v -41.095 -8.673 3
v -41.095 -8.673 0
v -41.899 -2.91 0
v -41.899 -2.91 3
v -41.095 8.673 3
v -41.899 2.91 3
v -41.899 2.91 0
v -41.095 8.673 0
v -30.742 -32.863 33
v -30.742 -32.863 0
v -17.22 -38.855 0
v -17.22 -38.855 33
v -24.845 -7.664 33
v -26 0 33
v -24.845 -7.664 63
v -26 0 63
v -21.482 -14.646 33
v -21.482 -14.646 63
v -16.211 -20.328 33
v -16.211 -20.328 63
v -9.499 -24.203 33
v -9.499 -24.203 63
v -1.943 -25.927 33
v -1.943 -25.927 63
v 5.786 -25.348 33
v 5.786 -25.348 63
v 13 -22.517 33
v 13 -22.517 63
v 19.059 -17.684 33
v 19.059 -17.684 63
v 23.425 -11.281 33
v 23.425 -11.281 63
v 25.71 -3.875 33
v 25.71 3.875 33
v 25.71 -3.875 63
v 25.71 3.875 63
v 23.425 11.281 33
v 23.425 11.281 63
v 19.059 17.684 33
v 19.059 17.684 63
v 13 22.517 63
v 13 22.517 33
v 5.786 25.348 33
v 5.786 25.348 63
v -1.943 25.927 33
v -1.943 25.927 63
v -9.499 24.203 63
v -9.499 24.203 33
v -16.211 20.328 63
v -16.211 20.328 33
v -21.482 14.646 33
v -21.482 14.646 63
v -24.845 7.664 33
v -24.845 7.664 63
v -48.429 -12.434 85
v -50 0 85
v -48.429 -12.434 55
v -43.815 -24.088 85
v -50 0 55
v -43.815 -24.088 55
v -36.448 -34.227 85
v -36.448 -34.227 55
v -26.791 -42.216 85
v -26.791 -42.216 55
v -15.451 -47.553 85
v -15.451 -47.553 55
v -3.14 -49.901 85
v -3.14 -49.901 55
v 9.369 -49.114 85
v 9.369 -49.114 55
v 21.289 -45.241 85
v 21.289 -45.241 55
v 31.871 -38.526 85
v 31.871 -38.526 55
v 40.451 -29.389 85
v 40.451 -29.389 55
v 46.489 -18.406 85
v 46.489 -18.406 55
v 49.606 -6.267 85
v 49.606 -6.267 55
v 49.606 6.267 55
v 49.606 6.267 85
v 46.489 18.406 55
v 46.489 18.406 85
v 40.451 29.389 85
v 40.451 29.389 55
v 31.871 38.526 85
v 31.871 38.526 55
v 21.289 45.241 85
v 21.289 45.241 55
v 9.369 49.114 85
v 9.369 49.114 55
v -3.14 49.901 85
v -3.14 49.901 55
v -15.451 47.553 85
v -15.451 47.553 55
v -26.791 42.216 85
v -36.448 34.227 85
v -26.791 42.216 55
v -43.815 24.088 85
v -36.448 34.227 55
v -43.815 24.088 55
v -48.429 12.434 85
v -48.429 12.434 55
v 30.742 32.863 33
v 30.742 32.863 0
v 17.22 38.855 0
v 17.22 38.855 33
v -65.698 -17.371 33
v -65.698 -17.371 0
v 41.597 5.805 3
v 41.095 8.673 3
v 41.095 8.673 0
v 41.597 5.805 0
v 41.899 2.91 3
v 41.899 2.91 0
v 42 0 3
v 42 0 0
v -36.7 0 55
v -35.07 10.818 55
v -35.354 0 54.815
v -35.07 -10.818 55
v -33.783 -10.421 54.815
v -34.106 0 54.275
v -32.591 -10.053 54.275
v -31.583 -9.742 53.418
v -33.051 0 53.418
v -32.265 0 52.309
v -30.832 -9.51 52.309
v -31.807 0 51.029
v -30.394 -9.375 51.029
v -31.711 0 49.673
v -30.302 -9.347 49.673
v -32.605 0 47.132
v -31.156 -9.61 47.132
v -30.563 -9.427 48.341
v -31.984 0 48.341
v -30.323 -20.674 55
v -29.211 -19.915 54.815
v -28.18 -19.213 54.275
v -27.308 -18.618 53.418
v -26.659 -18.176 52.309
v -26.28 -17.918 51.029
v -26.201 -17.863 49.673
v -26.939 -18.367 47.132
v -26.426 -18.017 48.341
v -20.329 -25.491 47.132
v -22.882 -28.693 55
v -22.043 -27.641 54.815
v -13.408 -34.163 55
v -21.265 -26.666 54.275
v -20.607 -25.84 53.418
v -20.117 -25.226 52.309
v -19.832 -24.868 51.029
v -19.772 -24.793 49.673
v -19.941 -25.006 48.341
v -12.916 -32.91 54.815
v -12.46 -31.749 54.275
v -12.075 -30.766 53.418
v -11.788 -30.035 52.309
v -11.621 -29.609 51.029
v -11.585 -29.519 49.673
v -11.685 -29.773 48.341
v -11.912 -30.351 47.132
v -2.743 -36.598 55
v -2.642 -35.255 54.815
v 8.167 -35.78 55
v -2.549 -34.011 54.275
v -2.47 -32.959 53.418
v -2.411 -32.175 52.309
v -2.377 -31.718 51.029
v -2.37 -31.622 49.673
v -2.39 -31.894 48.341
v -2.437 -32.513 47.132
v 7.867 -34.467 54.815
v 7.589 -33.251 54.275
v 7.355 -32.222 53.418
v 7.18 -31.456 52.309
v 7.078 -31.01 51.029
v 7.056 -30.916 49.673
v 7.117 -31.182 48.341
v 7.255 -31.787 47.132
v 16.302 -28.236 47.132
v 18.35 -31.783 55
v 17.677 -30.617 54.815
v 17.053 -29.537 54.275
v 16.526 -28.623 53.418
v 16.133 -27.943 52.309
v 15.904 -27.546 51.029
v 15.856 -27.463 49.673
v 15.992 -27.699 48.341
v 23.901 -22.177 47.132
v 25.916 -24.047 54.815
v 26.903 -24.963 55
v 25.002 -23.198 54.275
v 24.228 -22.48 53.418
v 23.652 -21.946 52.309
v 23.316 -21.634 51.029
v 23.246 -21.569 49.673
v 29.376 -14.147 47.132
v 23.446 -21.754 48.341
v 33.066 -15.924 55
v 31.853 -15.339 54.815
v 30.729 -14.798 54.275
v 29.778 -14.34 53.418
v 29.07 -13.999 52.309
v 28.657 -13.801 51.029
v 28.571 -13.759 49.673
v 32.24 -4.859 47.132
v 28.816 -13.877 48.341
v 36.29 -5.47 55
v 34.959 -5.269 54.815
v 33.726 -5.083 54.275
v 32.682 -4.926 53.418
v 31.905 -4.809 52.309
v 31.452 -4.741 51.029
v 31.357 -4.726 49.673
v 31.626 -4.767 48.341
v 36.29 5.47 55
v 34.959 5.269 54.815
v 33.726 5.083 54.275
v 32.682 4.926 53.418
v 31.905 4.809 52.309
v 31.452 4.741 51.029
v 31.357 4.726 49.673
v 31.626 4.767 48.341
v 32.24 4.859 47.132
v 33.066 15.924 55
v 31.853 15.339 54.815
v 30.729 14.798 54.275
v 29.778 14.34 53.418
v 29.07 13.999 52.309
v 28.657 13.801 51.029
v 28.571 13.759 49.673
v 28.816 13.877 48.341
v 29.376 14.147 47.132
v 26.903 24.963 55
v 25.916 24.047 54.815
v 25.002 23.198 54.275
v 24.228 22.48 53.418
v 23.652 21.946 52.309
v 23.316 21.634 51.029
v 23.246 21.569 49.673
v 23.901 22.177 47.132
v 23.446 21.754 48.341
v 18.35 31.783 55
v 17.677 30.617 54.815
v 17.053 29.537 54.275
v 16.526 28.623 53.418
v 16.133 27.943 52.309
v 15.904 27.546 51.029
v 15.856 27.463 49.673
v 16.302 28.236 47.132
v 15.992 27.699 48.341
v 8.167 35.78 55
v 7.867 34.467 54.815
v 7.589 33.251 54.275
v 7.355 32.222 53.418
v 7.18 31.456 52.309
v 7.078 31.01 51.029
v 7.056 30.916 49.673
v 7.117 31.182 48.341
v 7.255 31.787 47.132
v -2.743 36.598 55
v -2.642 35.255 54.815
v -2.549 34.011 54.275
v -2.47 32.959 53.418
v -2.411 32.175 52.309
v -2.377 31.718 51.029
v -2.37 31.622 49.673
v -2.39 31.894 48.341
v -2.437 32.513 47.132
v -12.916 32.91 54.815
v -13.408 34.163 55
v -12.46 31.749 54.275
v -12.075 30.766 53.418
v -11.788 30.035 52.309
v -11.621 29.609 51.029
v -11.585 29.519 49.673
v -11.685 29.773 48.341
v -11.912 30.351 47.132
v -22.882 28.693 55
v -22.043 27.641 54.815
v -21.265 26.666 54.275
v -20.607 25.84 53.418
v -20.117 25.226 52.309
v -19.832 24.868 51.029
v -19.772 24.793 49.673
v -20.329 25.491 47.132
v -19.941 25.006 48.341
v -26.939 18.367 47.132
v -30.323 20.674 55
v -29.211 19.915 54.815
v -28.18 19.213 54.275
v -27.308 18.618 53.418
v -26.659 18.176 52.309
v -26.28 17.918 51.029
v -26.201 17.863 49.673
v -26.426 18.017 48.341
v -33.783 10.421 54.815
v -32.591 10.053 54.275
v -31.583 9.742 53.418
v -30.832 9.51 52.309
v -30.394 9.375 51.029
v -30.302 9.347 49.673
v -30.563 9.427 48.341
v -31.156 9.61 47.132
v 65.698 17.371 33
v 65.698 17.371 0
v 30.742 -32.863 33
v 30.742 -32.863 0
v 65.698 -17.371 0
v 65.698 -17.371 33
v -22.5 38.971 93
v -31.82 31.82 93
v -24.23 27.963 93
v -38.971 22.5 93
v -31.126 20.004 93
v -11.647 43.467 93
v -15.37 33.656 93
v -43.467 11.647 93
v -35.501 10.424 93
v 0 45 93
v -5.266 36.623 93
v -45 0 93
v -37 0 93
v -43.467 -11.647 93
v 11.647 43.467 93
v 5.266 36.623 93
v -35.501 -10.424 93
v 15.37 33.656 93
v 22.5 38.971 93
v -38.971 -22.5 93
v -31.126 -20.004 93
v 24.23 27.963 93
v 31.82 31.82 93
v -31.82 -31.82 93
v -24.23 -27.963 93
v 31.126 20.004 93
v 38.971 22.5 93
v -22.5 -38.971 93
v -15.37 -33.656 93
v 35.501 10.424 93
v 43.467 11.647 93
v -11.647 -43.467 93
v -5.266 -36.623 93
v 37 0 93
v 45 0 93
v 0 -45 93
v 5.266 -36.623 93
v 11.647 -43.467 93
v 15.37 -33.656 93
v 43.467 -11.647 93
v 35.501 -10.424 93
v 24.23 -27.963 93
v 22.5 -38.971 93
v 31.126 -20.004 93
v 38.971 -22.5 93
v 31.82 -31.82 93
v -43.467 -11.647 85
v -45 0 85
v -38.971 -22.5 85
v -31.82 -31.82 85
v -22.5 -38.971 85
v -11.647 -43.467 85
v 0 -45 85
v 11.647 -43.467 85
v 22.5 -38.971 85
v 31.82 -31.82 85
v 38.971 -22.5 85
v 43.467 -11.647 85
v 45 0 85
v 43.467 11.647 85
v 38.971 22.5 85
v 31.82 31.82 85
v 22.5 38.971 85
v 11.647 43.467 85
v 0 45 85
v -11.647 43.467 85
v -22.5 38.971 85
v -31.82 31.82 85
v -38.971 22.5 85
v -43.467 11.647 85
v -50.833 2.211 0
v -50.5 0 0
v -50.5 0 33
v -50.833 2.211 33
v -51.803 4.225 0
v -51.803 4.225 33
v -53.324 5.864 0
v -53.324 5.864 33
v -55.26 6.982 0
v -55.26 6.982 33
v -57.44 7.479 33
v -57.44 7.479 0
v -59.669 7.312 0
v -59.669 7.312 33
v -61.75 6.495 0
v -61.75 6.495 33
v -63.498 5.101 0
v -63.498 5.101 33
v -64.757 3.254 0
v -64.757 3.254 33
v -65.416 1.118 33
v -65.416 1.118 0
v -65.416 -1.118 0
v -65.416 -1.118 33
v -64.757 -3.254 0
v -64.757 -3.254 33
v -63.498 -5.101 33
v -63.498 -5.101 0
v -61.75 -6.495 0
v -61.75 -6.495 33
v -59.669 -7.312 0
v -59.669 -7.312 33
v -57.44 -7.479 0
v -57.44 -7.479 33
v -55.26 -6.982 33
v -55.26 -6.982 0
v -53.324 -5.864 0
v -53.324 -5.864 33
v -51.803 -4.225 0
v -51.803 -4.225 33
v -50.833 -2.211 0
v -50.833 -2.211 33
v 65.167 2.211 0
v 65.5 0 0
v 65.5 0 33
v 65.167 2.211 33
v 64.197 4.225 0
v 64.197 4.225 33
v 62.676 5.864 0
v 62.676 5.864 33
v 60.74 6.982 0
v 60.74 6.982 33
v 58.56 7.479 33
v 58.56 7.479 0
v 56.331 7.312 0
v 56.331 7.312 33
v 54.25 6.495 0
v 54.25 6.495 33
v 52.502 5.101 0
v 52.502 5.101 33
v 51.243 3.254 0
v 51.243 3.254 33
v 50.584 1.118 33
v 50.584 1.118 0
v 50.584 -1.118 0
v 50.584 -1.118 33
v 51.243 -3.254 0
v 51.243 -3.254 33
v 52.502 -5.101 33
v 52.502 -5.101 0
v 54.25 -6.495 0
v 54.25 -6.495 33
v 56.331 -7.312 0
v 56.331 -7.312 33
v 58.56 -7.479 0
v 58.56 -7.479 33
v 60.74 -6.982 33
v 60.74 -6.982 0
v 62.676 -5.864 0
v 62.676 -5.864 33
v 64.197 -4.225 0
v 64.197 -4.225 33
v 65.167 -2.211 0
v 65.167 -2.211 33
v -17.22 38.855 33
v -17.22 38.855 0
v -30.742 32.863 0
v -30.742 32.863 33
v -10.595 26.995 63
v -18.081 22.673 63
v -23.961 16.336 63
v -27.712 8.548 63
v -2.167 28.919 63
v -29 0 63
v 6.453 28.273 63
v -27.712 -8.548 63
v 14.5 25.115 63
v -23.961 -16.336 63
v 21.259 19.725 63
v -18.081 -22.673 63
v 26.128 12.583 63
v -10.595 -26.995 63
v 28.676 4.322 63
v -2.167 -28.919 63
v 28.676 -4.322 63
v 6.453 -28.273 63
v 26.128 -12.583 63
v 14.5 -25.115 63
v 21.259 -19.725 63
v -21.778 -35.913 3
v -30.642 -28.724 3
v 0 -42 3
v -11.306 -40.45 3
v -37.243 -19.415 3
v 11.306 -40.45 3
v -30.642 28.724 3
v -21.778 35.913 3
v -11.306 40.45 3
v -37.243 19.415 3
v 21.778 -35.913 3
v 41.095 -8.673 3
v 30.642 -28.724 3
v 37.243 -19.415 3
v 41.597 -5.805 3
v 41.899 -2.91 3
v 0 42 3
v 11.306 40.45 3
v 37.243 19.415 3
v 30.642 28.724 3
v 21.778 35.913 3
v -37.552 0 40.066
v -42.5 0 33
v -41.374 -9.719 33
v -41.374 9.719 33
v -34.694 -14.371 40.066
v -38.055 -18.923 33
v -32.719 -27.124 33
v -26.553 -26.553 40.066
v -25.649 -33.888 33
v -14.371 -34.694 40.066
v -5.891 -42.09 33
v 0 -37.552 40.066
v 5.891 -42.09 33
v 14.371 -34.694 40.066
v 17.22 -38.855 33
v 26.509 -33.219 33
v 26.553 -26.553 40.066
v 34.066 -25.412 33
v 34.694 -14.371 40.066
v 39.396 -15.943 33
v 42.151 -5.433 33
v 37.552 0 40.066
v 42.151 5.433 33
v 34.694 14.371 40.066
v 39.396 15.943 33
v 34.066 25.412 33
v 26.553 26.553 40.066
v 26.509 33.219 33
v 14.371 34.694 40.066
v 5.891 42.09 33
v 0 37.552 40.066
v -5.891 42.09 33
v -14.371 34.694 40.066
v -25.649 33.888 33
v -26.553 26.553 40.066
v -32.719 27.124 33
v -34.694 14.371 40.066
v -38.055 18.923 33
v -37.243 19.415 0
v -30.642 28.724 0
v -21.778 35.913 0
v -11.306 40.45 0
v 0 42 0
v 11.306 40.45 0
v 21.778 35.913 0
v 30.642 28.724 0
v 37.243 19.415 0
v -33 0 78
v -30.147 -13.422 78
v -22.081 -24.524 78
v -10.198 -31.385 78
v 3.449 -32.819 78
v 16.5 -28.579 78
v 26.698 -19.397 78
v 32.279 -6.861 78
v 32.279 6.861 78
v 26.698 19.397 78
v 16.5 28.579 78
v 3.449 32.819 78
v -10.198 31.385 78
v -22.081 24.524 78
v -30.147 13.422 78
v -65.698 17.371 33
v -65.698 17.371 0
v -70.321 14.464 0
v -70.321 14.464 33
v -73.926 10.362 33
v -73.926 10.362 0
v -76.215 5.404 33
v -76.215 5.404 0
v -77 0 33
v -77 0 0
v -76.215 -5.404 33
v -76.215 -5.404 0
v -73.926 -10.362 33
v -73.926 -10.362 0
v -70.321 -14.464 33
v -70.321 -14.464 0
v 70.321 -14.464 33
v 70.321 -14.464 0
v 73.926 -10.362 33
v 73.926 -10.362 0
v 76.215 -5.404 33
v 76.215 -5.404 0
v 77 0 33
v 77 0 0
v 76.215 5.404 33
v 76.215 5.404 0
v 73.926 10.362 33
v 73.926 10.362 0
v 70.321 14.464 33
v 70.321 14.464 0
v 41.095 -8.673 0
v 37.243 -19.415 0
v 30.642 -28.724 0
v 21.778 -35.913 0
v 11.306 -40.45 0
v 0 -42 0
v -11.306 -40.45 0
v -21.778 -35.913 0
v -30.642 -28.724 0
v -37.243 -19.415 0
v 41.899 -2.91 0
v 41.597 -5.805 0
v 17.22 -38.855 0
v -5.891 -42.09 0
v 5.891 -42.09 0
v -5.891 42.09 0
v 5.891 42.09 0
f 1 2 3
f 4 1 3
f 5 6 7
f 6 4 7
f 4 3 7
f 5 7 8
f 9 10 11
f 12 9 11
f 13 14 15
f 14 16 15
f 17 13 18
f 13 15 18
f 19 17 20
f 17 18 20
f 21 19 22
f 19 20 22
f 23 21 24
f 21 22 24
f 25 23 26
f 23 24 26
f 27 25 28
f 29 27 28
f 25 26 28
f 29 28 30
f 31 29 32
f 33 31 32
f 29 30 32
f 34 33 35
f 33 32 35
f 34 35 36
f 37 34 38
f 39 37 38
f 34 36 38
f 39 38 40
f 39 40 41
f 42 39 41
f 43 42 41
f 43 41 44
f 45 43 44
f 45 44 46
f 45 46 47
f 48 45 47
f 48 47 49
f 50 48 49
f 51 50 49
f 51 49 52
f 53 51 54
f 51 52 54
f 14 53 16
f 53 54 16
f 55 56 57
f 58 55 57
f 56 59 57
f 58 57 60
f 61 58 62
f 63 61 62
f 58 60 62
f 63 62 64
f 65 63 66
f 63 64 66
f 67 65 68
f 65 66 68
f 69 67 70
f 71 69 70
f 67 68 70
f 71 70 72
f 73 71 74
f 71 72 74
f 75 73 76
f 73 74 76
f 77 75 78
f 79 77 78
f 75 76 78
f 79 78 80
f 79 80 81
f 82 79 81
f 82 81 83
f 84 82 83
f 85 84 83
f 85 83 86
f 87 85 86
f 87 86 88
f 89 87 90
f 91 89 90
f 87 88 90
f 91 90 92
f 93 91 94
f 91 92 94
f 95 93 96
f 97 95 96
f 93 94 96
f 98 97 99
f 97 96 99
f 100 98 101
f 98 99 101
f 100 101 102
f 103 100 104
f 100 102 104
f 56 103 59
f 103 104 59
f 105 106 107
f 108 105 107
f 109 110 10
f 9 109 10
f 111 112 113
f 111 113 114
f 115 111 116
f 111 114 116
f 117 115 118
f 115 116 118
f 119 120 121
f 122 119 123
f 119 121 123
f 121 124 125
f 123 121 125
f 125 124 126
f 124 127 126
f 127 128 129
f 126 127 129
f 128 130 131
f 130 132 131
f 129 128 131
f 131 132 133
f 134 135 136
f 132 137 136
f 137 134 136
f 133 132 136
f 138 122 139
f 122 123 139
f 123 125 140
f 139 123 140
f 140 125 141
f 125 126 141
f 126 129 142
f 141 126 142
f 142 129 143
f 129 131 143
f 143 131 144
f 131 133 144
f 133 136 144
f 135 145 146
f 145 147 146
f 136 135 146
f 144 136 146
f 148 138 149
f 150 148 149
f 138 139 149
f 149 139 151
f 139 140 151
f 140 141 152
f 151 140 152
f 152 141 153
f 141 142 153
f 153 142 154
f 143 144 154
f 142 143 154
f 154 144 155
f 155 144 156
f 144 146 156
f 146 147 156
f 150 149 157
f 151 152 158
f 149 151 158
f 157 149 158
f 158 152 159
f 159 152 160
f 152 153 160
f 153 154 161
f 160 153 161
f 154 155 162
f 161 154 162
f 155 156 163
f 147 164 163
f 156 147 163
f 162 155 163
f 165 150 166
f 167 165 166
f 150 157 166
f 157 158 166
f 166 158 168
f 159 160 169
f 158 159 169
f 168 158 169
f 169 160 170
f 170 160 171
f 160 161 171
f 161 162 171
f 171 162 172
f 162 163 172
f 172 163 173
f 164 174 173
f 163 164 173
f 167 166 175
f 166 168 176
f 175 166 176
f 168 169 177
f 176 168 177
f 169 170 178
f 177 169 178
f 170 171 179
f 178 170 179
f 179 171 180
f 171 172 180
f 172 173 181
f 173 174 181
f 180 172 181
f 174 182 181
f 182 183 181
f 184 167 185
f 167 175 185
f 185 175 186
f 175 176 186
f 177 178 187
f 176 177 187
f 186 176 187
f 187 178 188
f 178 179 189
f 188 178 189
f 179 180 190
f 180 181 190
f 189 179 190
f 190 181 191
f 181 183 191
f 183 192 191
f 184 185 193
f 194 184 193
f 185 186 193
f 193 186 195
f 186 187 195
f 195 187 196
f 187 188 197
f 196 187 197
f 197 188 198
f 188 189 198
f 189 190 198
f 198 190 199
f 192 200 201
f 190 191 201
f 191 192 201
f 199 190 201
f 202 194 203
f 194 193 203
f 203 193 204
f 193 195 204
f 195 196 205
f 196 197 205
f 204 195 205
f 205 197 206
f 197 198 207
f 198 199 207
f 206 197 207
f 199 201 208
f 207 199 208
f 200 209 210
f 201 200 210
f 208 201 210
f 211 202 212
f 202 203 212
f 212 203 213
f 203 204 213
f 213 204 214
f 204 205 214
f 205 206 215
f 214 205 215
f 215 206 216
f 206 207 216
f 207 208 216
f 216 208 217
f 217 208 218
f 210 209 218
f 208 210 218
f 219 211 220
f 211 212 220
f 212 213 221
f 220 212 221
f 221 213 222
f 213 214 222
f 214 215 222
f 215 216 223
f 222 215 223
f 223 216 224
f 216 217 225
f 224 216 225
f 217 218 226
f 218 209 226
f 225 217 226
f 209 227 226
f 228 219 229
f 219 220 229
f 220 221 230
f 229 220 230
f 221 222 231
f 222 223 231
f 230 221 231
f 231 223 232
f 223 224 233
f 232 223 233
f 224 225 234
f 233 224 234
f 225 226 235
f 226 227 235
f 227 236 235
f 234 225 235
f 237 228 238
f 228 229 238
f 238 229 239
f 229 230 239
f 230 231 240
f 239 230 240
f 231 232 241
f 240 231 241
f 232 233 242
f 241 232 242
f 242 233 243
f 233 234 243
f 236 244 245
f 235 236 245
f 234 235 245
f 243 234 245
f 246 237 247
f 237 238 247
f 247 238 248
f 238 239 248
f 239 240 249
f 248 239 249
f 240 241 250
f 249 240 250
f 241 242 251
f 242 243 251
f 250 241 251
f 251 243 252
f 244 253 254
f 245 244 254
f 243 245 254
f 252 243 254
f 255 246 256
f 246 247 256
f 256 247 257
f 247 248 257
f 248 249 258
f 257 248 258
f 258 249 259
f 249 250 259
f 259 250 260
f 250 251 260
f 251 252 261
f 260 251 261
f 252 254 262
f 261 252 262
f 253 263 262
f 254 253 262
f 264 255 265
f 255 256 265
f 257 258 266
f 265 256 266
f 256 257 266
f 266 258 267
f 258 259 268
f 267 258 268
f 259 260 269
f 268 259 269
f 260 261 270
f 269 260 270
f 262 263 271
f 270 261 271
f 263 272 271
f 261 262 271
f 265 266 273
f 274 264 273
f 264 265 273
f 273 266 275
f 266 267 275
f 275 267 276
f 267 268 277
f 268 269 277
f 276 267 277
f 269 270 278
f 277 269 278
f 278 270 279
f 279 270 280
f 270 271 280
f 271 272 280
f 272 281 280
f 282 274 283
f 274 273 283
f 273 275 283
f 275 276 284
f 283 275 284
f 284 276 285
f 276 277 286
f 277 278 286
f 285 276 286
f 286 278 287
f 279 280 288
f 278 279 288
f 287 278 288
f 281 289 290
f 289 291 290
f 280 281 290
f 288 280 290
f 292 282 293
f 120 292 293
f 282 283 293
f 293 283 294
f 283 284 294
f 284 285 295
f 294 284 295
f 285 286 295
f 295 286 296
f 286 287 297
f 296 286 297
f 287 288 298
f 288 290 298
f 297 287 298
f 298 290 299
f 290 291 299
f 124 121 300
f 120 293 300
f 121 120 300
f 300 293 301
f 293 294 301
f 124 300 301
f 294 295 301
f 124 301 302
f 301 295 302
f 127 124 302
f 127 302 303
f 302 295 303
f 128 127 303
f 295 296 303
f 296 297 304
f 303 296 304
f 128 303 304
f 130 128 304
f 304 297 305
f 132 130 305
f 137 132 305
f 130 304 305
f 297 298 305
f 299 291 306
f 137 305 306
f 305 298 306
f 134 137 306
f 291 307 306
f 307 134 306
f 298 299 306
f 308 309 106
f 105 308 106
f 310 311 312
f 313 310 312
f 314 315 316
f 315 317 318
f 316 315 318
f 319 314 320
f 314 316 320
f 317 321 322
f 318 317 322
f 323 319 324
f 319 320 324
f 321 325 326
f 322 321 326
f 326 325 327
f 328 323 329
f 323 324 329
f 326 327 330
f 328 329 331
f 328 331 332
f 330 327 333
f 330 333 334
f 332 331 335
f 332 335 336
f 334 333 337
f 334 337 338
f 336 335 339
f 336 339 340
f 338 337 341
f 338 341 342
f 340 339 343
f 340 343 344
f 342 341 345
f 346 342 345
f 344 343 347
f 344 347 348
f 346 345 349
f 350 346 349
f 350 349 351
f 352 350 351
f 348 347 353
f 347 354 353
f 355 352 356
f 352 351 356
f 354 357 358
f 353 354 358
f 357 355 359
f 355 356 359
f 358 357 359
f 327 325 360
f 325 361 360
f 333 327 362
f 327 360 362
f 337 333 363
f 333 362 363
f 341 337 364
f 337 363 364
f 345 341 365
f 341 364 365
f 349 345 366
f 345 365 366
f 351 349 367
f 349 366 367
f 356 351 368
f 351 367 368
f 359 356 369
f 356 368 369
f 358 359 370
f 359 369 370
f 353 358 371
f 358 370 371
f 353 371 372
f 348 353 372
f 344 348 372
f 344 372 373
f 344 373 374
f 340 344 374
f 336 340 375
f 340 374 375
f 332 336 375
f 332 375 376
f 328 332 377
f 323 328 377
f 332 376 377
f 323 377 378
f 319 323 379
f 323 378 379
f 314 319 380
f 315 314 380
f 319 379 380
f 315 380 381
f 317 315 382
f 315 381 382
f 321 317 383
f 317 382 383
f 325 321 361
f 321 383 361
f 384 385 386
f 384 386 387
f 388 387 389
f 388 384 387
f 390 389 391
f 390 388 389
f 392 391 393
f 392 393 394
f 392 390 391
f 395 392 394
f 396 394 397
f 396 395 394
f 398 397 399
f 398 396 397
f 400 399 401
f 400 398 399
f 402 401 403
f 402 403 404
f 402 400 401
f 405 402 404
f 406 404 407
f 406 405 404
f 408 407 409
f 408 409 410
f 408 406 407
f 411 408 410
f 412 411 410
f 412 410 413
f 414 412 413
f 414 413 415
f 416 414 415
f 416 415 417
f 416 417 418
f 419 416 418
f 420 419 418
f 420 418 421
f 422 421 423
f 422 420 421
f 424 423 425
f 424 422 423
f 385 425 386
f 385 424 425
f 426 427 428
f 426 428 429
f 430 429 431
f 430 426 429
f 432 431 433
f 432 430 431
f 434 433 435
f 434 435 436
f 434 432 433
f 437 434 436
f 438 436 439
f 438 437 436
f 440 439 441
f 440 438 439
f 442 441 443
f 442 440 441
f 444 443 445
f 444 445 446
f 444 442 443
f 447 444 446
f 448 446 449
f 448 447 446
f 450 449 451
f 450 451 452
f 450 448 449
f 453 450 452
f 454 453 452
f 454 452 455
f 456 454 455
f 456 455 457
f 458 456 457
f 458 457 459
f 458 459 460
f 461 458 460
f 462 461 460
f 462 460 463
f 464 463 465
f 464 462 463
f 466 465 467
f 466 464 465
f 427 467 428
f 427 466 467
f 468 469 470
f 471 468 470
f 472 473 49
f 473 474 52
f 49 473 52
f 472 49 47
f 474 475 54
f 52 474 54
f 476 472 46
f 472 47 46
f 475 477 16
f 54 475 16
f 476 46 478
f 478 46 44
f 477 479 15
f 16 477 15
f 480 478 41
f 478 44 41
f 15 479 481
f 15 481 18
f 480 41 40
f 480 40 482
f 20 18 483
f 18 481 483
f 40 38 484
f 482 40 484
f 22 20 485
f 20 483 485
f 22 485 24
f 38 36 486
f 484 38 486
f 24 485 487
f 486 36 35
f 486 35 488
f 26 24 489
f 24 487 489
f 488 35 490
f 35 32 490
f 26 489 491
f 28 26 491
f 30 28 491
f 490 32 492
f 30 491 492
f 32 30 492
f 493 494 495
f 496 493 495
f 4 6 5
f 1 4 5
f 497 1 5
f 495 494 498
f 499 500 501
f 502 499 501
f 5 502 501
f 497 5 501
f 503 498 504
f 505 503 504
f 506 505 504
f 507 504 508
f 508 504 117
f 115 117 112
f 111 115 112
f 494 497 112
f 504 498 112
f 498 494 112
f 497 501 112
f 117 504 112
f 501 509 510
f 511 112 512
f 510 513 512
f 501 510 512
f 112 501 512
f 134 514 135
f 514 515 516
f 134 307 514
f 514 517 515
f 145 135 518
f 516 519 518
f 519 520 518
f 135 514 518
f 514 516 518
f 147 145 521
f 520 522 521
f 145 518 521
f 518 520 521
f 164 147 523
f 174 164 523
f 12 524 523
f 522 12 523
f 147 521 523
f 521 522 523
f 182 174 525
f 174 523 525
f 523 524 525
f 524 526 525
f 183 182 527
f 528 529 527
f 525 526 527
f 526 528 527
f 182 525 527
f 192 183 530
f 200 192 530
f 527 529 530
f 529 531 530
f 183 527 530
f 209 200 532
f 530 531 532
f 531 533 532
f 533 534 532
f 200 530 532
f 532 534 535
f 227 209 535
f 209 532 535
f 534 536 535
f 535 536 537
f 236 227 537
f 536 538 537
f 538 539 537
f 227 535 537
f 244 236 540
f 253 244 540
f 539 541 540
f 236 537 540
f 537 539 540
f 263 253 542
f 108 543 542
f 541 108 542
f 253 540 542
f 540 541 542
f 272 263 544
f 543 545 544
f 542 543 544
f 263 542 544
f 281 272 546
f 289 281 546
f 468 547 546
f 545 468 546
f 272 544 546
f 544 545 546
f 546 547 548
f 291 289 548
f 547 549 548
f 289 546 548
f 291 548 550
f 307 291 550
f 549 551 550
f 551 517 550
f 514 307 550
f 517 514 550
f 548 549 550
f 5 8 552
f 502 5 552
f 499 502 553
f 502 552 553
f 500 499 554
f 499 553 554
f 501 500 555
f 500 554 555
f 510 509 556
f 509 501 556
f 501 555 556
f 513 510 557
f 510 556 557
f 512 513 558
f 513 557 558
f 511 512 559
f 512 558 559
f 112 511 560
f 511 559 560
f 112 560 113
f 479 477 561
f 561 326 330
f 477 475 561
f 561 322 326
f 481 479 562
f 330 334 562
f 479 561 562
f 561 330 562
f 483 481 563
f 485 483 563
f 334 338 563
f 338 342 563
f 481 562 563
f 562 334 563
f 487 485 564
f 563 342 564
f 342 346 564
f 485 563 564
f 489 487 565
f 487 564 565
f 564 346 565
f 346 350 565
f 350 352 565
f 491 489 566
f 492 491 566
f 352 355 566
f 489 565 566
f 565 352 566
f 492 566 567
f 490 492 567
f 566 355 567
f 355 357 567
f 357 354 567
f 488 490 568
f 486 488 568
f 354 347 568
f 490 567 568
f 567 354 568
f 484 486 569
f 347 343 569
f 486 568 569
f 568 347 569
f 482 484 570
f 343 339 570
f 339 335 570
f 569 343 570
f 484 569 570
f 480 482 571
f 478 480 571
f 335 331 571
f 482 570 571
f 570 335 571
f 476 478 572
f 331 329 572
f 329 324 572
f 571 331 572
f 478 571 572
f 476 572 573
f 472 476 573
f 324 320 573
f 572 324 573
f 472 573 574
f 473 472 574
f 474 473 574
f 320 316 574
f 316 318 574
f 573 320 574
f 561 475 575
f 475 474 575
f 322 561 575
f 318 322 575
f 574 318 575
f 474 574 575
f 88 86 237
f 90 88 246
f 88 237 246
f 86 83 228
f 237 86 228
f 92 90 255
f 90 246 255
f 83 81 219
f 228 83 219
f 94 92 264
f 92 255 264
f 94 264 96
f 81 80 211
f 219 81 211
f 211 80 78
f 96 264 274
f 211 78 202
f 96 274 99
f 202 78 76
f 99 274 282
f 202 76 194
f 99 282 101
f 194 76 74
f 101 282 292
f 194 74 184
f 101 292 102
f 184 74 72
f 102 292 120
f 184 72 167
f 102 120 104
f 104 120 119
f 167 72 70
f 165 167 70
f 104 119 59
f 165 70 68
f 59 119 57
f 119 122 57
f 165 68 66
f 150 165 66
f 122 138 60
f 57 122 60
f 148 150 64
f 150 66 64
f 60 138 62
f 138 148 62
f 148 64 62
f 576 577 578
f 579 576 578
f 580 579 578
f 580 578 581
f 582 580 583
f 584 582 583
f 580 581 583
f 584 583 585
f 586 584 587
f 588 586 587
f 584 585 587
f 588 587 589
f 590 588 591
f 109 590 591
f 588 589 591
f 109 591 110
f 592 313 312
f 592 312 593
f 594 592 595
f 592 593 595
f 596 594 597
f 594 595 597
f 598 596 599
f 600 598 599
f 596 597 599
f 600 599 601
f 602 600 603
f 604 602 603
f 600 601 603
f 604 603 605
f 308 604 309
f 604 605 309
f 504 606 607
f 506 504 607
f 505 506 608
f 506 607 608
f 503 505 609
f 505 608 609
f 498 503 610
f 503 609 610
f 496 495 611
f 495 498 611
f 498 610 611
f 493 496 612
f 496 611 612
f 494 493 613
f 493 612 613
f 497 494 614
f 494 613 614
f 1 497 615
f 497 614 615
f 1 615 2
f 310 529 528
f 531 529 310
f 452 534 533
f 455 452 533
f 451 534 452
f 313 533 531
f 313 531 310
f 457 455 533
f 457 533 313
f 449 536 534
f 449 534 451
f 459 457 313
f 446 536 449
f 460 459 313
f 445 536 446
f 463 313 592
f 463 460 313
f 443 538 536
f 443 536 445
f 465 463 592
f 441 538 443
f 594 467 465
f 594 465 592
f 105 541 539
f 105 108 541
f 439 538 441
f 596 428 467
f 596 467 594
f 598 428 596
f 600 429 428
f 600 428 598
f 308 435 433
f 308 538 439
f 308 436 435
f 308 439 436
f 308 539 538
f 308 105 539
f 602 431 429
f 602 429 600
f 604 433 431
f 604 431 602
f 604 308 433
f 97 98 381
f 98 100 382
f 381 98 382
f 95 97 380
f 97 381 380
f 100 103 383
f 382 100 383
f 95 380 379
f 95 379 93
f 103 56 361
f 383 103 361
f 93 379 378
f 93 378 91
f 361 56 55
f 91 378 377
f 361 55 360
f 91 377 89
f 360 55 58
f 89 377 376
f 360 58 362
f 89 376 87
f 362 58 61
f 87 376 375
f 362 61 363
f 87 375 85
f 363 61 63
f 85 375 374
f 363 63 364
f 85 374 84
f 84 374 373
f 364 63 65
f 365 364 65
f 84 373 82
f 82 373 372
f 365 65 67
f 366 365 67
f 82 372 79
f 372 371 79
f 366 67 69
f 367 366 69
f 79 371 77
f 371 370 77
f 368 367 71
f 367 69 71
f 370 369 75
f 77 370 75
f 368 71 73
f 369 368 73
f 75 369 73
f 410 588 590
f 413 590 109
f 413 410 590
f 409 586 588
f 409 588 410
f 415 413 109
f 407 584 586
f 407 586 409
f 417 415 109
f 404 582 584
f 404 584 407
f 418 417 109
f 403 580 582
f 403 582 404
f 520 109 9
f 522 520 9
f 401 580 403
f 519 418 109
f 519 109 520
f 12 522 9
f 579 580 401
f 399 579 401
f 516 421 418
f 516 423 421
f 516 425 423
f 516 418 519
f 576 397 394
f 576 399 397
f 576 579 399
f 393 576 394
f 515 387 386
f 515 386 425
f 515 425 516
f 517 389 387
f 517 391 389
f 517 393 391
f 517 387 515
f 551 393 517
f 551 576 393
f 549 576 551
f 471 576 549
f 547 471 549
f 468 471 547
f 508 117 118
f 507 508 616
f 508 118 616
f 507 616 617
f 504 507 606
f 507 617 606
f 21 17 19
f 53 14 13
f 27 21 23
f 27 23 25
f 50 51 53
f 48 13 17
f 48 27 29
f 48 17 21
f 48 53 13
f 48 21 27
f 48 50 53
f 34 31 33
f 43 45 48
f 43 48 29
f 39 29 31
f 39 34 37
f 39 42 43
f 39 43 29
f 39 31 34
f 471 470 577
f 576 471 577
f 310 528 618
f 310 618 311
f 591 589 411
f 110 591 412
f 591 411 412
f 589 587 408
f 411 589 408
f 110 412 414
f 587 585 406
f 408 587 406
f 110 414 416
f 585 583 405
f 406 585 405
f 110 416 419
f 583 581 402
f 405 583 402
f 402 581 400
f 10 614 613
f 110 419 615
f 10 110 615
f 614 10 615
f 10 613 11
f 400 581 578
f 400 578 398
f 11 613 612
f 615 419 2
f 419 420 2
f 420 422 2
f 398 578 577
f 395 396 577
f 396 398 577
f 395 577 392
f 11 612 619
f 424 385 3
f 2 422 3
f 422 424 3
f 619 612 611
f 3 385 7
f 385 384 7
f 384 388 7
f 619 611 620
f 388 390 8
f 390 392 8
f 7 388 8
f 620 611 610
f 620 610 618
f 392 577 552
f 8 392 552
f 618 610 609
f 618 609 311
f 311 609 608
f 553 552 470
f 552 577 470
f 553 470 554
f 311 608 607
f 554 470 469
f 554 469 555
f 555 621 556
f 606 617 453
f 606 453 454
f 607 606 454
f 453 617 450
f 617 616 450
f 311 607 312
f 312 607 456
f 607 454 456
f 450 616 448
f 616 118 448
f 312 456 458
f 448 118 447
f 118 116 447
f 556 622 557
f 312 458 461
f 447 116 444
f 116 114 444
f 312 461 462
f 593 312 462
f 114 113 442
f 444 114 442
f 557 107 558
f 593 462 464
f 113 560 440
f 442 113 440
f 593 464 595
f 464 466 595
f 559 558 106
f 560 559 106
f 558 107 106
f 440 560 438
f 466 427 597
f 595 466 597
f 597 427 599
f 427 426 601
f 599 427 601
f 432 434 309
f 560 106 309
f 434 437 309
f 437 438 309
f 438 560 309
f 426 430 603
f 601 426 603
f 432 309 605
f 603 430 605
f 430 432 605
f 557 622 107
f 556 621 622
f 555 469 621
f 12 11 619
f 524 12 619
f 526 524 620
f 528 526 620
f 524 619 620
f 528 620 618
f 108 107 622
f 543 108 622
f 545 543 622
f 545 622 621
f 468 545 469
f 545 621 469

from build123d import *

# Parameters (mm, degrees)
F0_R     = 7.5
F3_DEPTH = 33
F5_START = 3
F4_R     = 42
F5_DEPTH = 30


with BuildPart() as f2:
    # F1 (on Front) → F2 (revolve)
    with BuildSketch(Plane.XZ):
        with BuildLine():
            Line((-32.6045845728, 47.1321178182), (-42.5, 33))
            Line((-42.5, 33), (-26, 33))
            Line((-26, 33), (-26, 63))
            Line((-26, 63), (-29, 63))
            Line((-29, 63), (-37, 93))
            Line((-37, 93), (-45, 93))
            Line((-45, 93), (-45, 85))
            Line((-45, 85), (-50, 85))
            Line((-50, 85), (-50, 55))
            Line((-50, 55), (-36.7003447942, 55))
            ThreePointArc((-36.7003447942, 55), (-32.2652906284, 52.3087430662), (-32.6045845728, 47.1321178182))
        make_face()
    revolve(axis=Axis((0, 0, 36.171267882), (0, 0, 1)))

    # F0 (on Top) → F3 (join)
    with BuildSketch(Plane.XY):
        with BuildLine():
            ThreePointArc((30.7416238862, 32.8626316785), (38.4714348159, 23.3441363774), (43.3448275862, 12.0923910589))
            ThreePointArc((43.3448275862, 12.0923910589), (53.6337221418, 18.491501228), (65.6982762183, 17.3705654274))
            Line((65.6982762183, 17.3705654274), (30.7416238862, 32.8626316785))
        make_face()
        with BuildLine():
            ThreePointArc((-43.3448275862, 12.0923910589), (-38.4714348159, 23.3441363774), (-30.7416238862, 32.8626316785))
            Line((-30.7416238862, 32.8626316785), (-65.6982778503, 17.3705647041))
            ThreePointArc((-65.6982778503, 17.3705647041), (-53.6337230105, 18.4915014331), (-43.3448275862, 12.0923910589))
        make_face()
        with BuildLine():
            Line((-65.6982756625, -17.3705656737), (-30.7416238862, -32.8626316785))
            ThreePointArc((-30.7416238862, -32.8626316785), (-38.4714348159, -23.3441363774), (-43.3448275862, -12.0923910589))
            ThreePointArc((-43.3448275862, -12.0923910589), (-53.633721846, -18.4915011581), (-65.6982756625, -17.3705656737))
        make_face()
        with BuildLine():
            ThreePointArc((65.6982756625, -17.3705656737), (53.633721846, -18.4915011582), (43.3448275862, -12.0923910589))
            ThreePointArc((43.3448275862, -12.0923910589), (38.4714348159, -23.3441363774), (30.7416238862, -32.8626316785))
            Line((30.7416238862, -32.8626316785), (65.6982756625, -17.3705656737))
        make_face()
        with BuildLine():
            ThreePointArc((41.4590517241, 9.3486378759), (42.3417264073, 10.7618989076), (43.3448275862, 12.0923910589))
            ThreePointArc((43.3448275862, 12.0923910589), (38.4714348159, 23.3441363774), (30.7416238862, 32.8626316785))
            Line((30.7416238862, 32.8626316785), (17.219827087, 38.8552127146))
            ThreePointArc((17.219827087, 38.8552127146), (32.8399481472, 26.9775426177), (41.4590517241, 9.3486378759))
        make_face()
        with BuildLine():
            Line((-17.2198272904, 38.8552126244), (-30.7416238862, 32.8626316785))
            ThreePointArc((-30.7416238862, 32.8626316785), (-38.4714348159, 23.3441363774), (-43.3448275862, 12.0923910589))
            ThreePointArc((-43.3448275862, 12.0923910589), (-42.3417264073, 10.7618989076), (-41.4590517241, 9.3486378759))
            ThreePointArc((-41.4590517241, 9.3486378759), (-32.8399482178, 26.9775425317), (-17.2198272904, 38.8552126244))
        make_face()
        with BuildLine():
            ThreePointArc((-43.3448275862, -12.0923910589), (-45, 0), (-43.3448275862, 12.0923910589))
            ThreePointArc((-43.3448275862, 12.0923910589), (-53.6337230105, 18.4915014331), (-65.6982778503, 17.3705647041))
            ThreePointArc((-65.6982778503, 17.3705647041), (-77, -1.1965e-06), (-65.6982756625, -17.3705656737))
            ThreePointArc((-65.6982756625, -17.3705656737), (-53.633721846, -18.4915011581), (-43.3448275862, -12.0923910589))
        make_face()
        with Locations((-58, 0)):
            Circle(F0_R, mode=Mode.SUBTRACT)
        with BuildLine():
            ThreePointArc((-43.3448275862, -12.0923910589), (-38.4714348159, -23.3441363774), (-30.7416238862, -32.8626316785))
            Line((-30.7416238862, -32.8626316785), (-17.2198274837, -38.8552125388))
            ThreePointArc((-17.2198274837, -38.8552125388), (-32.8399482849, -26.9775424501), (-41.4590517241, -9.3486378759))
            ThreePointArc((-41.4590517241, -9.3486378759), (-42.3417264073, -10.7618989076), (-43.3448275862, -12.0923910589))
        make_face()
        with BuildLine():
            ThreePointArc((30.7416238862, -32.8626316785), (38.4714348159, -23.3441363774), (43.3448275862, -12.0923910589))
            ThreePointArc((43.3448275862, -12.0923910589), (42.3417264073, -10.7618989076), (41.4590517241, -9.3486378759))
            ThreePointArc((41.4590517241, -9.3486378759), (32.8399481447, -26.9775426208), (17.2198270797, -38.8552127178))
            Line((17.2198270797, -38.8552127178), (30.7416238862, -32.8626316785))
        make_face()
        with BuildLine():
            ThreePointArc((43.3448275862, 12.0923910589), (44.5842867016, 6.1025715326), (45, 0))
            ThreePointArc((45, 0), (44.5842867016, -6.1025715326), (43.3448275862, -12.0923910589))
            ThreePointArc((43.3448275862, -12.0923910589), (53.633721846, -18.4915011582), (65.6982756625, -17.3705656737))
            ThreePointArc((65.6982756625, -17.3705656737), (73.9258789018, -10.3617750027), (77, 0))
            ThreePointArc((77, 0), (73.9258790675, 10.3617747479), (65.6982762183, 17.3705654274))
            ThreePointArc((65.6982762183, 17.3705654274), (53.6337221418, 18.491501228), (43.3448275862, 12.0923910589))
        make_face()
        with Locations((58, 0)):
            Circle(F0_R, mode=Mode.SUBTRACT)
        with BuildLine():
            ThreePointArc((43.3448275862, -12.0923910589), (44.5842867016, -6.1025715326), (45, 0))
            ThreePointArc((45, 0), (44.5842867016, 6.1025715326), (43.3448275862, 12.0923910589))
            ThreePointArc((43.3448275862, 12.0923910589), (42.3417264073, 10.7618989076), (41.4590517241, 9.3486378759))
            ThreePointArc((41.4590517241, 9.3486378759), (42.2389612696, 4.7032064448), (42.5, 0))
            ThreePointArc((42.5, 0), (42.2389612696, -4.7032064448), (41.4590517241, -9.3486378759))
            ThreePointArc((41.4590517241, -9.3486378759), (42.3417264073, -10.7618989076), (43.3448275862, -12.0923910589))
        make_face()
        with BuildLine():
            ThreePointArc((-41.4590517241, 9.3486378759), (-42.3417264073, 10.7618989076), (-43.3448275862, 12.0923910589))
            ThreePointArc((-43.3448275862, 12.0923910589), (-45, 0), (-43.3448275862, -12.0923910589))
            ThreePointArc((-43.3448275862, -12.0923910589), (-42.3417264073, -10.7618989076), (-41.4590517241, -9.3486378759))
            ThreePointArc((-41.4590517241, -9.3486378759), (-42.5, 0), (-41.4590517241, 9.3486378759))
        make_face()
        with BuildLine():
            ThreePointArc((17.2198270797, -38.8552127178), (32.8399481447, -26.9775426208), (41.4590517241, -9.3486378759))
            ThreePointArc((41.4590517241, -9.3486378759), (41.2735245316, -9.0124923526), (41.0948275862, -8.672666583))
            ThreePointArc((41.0948275862, -8.672666583), (0, -42), (-41.0948275862, -8.672666583))
            ThreePointArc((-41.0948275862, -8.672666583), (-41.2735245316, -9.0124923526), (-41.4590517241, -9.3486378759))
            ThreePointArc((-41.4590517241, -9.3486378759), (-32.8399482849, -26.9775424501), (-17.2198274837, -38.8552125388))
            ThreePointArc((-17.2198274837, -38.8552125388), (-2.209e-07, -42.5), (17.2198270797, -38.8552127178))
        make_face()
        with BuildLine():
            ThreePointArc((41.0948275862, 8.672666583), (41.2735245316, 9.0124923526), (41.4590517241, 9.3486378759))
            ThreePointArc((41.4590517241, 9.3486378759), (32.8399481472, 26.9775426177), (17.219827087, 38.8552127146))
            ThreePointArc((17.219827087, 38.8552127146), (-1.113e-07, 42.5), (-17.2198272904, 38.8552126244))
            ThreePointArc((-17.2198272904, 38.8552126244), (-32.8399482178, 26.9775425317), (-41.4590517241, 9.3486378759))
            ThreePointArc((-41.4590517241, 9.3486378759), (-41.2735245316, 9.0124923526), (-41.0948275862, 8.672666583))
            ThreePointArc((-41.0948275862, 8.672666583), (0, 42), (41.0948275862, 8.672666583))
        make_face()
        with BuildLine():
            ThreePointArc((42.5, 0), (42.2389612696, 4.7032064448), (41.4590517241, 9.3486378759))
            ThreePointArc((41.4590517241, 9.3486378759), (41.2735245316, 9.0124923526), (41.0948275862, 8.672666583))
            ThreePointArc((41.0948275862, 8.672666583), (41.7730939638, 4.3598876923), (42, 0))
            ThreePointArc((42, 0), (41.7730939638, -4.3598876923), (41.0948275862, -8.672666583))
            ThreePointArc((41.0948275862, -8.672666583), (41.2735245316, -9.0124923526), (41.4590517241, -9.3486378759))
            ThreePointArc((41.4590517241, -9.3486378759), (42.2389612696, -4.7032064448), (42.5, 0))
        make_face()
        with BuildLine():
            ThreePointArc((-41.0948275862, -8.672666583), (-42, 0), (-41.0948275862, 8.672666583))
            ThreePointArc((-41.0948275862, 8.672666583), (-41.2735245316, 9.0124923526), (-41.4590517241, 9.3486378759))
            ThreePointArc((-41.4590517241, 9.3486378759), (-42.5, 0), (-41.4590517241, -9.3486378759))
            ThreePointArc((-41.4590517241, -9.3486378759), (-41.2735245316, -9.0124923526), (-41.0948275862, -8.672666583))
        make_face()
    extrude(amount=F3_DEPTH)

    # F4 (on Top) → F5 (join)
    with BuildSketch(Plane.XY.offset(F5_START)):
        Circle(F4_R)
    extrude(amount=F5_DEPTH)


solid = f2.part
